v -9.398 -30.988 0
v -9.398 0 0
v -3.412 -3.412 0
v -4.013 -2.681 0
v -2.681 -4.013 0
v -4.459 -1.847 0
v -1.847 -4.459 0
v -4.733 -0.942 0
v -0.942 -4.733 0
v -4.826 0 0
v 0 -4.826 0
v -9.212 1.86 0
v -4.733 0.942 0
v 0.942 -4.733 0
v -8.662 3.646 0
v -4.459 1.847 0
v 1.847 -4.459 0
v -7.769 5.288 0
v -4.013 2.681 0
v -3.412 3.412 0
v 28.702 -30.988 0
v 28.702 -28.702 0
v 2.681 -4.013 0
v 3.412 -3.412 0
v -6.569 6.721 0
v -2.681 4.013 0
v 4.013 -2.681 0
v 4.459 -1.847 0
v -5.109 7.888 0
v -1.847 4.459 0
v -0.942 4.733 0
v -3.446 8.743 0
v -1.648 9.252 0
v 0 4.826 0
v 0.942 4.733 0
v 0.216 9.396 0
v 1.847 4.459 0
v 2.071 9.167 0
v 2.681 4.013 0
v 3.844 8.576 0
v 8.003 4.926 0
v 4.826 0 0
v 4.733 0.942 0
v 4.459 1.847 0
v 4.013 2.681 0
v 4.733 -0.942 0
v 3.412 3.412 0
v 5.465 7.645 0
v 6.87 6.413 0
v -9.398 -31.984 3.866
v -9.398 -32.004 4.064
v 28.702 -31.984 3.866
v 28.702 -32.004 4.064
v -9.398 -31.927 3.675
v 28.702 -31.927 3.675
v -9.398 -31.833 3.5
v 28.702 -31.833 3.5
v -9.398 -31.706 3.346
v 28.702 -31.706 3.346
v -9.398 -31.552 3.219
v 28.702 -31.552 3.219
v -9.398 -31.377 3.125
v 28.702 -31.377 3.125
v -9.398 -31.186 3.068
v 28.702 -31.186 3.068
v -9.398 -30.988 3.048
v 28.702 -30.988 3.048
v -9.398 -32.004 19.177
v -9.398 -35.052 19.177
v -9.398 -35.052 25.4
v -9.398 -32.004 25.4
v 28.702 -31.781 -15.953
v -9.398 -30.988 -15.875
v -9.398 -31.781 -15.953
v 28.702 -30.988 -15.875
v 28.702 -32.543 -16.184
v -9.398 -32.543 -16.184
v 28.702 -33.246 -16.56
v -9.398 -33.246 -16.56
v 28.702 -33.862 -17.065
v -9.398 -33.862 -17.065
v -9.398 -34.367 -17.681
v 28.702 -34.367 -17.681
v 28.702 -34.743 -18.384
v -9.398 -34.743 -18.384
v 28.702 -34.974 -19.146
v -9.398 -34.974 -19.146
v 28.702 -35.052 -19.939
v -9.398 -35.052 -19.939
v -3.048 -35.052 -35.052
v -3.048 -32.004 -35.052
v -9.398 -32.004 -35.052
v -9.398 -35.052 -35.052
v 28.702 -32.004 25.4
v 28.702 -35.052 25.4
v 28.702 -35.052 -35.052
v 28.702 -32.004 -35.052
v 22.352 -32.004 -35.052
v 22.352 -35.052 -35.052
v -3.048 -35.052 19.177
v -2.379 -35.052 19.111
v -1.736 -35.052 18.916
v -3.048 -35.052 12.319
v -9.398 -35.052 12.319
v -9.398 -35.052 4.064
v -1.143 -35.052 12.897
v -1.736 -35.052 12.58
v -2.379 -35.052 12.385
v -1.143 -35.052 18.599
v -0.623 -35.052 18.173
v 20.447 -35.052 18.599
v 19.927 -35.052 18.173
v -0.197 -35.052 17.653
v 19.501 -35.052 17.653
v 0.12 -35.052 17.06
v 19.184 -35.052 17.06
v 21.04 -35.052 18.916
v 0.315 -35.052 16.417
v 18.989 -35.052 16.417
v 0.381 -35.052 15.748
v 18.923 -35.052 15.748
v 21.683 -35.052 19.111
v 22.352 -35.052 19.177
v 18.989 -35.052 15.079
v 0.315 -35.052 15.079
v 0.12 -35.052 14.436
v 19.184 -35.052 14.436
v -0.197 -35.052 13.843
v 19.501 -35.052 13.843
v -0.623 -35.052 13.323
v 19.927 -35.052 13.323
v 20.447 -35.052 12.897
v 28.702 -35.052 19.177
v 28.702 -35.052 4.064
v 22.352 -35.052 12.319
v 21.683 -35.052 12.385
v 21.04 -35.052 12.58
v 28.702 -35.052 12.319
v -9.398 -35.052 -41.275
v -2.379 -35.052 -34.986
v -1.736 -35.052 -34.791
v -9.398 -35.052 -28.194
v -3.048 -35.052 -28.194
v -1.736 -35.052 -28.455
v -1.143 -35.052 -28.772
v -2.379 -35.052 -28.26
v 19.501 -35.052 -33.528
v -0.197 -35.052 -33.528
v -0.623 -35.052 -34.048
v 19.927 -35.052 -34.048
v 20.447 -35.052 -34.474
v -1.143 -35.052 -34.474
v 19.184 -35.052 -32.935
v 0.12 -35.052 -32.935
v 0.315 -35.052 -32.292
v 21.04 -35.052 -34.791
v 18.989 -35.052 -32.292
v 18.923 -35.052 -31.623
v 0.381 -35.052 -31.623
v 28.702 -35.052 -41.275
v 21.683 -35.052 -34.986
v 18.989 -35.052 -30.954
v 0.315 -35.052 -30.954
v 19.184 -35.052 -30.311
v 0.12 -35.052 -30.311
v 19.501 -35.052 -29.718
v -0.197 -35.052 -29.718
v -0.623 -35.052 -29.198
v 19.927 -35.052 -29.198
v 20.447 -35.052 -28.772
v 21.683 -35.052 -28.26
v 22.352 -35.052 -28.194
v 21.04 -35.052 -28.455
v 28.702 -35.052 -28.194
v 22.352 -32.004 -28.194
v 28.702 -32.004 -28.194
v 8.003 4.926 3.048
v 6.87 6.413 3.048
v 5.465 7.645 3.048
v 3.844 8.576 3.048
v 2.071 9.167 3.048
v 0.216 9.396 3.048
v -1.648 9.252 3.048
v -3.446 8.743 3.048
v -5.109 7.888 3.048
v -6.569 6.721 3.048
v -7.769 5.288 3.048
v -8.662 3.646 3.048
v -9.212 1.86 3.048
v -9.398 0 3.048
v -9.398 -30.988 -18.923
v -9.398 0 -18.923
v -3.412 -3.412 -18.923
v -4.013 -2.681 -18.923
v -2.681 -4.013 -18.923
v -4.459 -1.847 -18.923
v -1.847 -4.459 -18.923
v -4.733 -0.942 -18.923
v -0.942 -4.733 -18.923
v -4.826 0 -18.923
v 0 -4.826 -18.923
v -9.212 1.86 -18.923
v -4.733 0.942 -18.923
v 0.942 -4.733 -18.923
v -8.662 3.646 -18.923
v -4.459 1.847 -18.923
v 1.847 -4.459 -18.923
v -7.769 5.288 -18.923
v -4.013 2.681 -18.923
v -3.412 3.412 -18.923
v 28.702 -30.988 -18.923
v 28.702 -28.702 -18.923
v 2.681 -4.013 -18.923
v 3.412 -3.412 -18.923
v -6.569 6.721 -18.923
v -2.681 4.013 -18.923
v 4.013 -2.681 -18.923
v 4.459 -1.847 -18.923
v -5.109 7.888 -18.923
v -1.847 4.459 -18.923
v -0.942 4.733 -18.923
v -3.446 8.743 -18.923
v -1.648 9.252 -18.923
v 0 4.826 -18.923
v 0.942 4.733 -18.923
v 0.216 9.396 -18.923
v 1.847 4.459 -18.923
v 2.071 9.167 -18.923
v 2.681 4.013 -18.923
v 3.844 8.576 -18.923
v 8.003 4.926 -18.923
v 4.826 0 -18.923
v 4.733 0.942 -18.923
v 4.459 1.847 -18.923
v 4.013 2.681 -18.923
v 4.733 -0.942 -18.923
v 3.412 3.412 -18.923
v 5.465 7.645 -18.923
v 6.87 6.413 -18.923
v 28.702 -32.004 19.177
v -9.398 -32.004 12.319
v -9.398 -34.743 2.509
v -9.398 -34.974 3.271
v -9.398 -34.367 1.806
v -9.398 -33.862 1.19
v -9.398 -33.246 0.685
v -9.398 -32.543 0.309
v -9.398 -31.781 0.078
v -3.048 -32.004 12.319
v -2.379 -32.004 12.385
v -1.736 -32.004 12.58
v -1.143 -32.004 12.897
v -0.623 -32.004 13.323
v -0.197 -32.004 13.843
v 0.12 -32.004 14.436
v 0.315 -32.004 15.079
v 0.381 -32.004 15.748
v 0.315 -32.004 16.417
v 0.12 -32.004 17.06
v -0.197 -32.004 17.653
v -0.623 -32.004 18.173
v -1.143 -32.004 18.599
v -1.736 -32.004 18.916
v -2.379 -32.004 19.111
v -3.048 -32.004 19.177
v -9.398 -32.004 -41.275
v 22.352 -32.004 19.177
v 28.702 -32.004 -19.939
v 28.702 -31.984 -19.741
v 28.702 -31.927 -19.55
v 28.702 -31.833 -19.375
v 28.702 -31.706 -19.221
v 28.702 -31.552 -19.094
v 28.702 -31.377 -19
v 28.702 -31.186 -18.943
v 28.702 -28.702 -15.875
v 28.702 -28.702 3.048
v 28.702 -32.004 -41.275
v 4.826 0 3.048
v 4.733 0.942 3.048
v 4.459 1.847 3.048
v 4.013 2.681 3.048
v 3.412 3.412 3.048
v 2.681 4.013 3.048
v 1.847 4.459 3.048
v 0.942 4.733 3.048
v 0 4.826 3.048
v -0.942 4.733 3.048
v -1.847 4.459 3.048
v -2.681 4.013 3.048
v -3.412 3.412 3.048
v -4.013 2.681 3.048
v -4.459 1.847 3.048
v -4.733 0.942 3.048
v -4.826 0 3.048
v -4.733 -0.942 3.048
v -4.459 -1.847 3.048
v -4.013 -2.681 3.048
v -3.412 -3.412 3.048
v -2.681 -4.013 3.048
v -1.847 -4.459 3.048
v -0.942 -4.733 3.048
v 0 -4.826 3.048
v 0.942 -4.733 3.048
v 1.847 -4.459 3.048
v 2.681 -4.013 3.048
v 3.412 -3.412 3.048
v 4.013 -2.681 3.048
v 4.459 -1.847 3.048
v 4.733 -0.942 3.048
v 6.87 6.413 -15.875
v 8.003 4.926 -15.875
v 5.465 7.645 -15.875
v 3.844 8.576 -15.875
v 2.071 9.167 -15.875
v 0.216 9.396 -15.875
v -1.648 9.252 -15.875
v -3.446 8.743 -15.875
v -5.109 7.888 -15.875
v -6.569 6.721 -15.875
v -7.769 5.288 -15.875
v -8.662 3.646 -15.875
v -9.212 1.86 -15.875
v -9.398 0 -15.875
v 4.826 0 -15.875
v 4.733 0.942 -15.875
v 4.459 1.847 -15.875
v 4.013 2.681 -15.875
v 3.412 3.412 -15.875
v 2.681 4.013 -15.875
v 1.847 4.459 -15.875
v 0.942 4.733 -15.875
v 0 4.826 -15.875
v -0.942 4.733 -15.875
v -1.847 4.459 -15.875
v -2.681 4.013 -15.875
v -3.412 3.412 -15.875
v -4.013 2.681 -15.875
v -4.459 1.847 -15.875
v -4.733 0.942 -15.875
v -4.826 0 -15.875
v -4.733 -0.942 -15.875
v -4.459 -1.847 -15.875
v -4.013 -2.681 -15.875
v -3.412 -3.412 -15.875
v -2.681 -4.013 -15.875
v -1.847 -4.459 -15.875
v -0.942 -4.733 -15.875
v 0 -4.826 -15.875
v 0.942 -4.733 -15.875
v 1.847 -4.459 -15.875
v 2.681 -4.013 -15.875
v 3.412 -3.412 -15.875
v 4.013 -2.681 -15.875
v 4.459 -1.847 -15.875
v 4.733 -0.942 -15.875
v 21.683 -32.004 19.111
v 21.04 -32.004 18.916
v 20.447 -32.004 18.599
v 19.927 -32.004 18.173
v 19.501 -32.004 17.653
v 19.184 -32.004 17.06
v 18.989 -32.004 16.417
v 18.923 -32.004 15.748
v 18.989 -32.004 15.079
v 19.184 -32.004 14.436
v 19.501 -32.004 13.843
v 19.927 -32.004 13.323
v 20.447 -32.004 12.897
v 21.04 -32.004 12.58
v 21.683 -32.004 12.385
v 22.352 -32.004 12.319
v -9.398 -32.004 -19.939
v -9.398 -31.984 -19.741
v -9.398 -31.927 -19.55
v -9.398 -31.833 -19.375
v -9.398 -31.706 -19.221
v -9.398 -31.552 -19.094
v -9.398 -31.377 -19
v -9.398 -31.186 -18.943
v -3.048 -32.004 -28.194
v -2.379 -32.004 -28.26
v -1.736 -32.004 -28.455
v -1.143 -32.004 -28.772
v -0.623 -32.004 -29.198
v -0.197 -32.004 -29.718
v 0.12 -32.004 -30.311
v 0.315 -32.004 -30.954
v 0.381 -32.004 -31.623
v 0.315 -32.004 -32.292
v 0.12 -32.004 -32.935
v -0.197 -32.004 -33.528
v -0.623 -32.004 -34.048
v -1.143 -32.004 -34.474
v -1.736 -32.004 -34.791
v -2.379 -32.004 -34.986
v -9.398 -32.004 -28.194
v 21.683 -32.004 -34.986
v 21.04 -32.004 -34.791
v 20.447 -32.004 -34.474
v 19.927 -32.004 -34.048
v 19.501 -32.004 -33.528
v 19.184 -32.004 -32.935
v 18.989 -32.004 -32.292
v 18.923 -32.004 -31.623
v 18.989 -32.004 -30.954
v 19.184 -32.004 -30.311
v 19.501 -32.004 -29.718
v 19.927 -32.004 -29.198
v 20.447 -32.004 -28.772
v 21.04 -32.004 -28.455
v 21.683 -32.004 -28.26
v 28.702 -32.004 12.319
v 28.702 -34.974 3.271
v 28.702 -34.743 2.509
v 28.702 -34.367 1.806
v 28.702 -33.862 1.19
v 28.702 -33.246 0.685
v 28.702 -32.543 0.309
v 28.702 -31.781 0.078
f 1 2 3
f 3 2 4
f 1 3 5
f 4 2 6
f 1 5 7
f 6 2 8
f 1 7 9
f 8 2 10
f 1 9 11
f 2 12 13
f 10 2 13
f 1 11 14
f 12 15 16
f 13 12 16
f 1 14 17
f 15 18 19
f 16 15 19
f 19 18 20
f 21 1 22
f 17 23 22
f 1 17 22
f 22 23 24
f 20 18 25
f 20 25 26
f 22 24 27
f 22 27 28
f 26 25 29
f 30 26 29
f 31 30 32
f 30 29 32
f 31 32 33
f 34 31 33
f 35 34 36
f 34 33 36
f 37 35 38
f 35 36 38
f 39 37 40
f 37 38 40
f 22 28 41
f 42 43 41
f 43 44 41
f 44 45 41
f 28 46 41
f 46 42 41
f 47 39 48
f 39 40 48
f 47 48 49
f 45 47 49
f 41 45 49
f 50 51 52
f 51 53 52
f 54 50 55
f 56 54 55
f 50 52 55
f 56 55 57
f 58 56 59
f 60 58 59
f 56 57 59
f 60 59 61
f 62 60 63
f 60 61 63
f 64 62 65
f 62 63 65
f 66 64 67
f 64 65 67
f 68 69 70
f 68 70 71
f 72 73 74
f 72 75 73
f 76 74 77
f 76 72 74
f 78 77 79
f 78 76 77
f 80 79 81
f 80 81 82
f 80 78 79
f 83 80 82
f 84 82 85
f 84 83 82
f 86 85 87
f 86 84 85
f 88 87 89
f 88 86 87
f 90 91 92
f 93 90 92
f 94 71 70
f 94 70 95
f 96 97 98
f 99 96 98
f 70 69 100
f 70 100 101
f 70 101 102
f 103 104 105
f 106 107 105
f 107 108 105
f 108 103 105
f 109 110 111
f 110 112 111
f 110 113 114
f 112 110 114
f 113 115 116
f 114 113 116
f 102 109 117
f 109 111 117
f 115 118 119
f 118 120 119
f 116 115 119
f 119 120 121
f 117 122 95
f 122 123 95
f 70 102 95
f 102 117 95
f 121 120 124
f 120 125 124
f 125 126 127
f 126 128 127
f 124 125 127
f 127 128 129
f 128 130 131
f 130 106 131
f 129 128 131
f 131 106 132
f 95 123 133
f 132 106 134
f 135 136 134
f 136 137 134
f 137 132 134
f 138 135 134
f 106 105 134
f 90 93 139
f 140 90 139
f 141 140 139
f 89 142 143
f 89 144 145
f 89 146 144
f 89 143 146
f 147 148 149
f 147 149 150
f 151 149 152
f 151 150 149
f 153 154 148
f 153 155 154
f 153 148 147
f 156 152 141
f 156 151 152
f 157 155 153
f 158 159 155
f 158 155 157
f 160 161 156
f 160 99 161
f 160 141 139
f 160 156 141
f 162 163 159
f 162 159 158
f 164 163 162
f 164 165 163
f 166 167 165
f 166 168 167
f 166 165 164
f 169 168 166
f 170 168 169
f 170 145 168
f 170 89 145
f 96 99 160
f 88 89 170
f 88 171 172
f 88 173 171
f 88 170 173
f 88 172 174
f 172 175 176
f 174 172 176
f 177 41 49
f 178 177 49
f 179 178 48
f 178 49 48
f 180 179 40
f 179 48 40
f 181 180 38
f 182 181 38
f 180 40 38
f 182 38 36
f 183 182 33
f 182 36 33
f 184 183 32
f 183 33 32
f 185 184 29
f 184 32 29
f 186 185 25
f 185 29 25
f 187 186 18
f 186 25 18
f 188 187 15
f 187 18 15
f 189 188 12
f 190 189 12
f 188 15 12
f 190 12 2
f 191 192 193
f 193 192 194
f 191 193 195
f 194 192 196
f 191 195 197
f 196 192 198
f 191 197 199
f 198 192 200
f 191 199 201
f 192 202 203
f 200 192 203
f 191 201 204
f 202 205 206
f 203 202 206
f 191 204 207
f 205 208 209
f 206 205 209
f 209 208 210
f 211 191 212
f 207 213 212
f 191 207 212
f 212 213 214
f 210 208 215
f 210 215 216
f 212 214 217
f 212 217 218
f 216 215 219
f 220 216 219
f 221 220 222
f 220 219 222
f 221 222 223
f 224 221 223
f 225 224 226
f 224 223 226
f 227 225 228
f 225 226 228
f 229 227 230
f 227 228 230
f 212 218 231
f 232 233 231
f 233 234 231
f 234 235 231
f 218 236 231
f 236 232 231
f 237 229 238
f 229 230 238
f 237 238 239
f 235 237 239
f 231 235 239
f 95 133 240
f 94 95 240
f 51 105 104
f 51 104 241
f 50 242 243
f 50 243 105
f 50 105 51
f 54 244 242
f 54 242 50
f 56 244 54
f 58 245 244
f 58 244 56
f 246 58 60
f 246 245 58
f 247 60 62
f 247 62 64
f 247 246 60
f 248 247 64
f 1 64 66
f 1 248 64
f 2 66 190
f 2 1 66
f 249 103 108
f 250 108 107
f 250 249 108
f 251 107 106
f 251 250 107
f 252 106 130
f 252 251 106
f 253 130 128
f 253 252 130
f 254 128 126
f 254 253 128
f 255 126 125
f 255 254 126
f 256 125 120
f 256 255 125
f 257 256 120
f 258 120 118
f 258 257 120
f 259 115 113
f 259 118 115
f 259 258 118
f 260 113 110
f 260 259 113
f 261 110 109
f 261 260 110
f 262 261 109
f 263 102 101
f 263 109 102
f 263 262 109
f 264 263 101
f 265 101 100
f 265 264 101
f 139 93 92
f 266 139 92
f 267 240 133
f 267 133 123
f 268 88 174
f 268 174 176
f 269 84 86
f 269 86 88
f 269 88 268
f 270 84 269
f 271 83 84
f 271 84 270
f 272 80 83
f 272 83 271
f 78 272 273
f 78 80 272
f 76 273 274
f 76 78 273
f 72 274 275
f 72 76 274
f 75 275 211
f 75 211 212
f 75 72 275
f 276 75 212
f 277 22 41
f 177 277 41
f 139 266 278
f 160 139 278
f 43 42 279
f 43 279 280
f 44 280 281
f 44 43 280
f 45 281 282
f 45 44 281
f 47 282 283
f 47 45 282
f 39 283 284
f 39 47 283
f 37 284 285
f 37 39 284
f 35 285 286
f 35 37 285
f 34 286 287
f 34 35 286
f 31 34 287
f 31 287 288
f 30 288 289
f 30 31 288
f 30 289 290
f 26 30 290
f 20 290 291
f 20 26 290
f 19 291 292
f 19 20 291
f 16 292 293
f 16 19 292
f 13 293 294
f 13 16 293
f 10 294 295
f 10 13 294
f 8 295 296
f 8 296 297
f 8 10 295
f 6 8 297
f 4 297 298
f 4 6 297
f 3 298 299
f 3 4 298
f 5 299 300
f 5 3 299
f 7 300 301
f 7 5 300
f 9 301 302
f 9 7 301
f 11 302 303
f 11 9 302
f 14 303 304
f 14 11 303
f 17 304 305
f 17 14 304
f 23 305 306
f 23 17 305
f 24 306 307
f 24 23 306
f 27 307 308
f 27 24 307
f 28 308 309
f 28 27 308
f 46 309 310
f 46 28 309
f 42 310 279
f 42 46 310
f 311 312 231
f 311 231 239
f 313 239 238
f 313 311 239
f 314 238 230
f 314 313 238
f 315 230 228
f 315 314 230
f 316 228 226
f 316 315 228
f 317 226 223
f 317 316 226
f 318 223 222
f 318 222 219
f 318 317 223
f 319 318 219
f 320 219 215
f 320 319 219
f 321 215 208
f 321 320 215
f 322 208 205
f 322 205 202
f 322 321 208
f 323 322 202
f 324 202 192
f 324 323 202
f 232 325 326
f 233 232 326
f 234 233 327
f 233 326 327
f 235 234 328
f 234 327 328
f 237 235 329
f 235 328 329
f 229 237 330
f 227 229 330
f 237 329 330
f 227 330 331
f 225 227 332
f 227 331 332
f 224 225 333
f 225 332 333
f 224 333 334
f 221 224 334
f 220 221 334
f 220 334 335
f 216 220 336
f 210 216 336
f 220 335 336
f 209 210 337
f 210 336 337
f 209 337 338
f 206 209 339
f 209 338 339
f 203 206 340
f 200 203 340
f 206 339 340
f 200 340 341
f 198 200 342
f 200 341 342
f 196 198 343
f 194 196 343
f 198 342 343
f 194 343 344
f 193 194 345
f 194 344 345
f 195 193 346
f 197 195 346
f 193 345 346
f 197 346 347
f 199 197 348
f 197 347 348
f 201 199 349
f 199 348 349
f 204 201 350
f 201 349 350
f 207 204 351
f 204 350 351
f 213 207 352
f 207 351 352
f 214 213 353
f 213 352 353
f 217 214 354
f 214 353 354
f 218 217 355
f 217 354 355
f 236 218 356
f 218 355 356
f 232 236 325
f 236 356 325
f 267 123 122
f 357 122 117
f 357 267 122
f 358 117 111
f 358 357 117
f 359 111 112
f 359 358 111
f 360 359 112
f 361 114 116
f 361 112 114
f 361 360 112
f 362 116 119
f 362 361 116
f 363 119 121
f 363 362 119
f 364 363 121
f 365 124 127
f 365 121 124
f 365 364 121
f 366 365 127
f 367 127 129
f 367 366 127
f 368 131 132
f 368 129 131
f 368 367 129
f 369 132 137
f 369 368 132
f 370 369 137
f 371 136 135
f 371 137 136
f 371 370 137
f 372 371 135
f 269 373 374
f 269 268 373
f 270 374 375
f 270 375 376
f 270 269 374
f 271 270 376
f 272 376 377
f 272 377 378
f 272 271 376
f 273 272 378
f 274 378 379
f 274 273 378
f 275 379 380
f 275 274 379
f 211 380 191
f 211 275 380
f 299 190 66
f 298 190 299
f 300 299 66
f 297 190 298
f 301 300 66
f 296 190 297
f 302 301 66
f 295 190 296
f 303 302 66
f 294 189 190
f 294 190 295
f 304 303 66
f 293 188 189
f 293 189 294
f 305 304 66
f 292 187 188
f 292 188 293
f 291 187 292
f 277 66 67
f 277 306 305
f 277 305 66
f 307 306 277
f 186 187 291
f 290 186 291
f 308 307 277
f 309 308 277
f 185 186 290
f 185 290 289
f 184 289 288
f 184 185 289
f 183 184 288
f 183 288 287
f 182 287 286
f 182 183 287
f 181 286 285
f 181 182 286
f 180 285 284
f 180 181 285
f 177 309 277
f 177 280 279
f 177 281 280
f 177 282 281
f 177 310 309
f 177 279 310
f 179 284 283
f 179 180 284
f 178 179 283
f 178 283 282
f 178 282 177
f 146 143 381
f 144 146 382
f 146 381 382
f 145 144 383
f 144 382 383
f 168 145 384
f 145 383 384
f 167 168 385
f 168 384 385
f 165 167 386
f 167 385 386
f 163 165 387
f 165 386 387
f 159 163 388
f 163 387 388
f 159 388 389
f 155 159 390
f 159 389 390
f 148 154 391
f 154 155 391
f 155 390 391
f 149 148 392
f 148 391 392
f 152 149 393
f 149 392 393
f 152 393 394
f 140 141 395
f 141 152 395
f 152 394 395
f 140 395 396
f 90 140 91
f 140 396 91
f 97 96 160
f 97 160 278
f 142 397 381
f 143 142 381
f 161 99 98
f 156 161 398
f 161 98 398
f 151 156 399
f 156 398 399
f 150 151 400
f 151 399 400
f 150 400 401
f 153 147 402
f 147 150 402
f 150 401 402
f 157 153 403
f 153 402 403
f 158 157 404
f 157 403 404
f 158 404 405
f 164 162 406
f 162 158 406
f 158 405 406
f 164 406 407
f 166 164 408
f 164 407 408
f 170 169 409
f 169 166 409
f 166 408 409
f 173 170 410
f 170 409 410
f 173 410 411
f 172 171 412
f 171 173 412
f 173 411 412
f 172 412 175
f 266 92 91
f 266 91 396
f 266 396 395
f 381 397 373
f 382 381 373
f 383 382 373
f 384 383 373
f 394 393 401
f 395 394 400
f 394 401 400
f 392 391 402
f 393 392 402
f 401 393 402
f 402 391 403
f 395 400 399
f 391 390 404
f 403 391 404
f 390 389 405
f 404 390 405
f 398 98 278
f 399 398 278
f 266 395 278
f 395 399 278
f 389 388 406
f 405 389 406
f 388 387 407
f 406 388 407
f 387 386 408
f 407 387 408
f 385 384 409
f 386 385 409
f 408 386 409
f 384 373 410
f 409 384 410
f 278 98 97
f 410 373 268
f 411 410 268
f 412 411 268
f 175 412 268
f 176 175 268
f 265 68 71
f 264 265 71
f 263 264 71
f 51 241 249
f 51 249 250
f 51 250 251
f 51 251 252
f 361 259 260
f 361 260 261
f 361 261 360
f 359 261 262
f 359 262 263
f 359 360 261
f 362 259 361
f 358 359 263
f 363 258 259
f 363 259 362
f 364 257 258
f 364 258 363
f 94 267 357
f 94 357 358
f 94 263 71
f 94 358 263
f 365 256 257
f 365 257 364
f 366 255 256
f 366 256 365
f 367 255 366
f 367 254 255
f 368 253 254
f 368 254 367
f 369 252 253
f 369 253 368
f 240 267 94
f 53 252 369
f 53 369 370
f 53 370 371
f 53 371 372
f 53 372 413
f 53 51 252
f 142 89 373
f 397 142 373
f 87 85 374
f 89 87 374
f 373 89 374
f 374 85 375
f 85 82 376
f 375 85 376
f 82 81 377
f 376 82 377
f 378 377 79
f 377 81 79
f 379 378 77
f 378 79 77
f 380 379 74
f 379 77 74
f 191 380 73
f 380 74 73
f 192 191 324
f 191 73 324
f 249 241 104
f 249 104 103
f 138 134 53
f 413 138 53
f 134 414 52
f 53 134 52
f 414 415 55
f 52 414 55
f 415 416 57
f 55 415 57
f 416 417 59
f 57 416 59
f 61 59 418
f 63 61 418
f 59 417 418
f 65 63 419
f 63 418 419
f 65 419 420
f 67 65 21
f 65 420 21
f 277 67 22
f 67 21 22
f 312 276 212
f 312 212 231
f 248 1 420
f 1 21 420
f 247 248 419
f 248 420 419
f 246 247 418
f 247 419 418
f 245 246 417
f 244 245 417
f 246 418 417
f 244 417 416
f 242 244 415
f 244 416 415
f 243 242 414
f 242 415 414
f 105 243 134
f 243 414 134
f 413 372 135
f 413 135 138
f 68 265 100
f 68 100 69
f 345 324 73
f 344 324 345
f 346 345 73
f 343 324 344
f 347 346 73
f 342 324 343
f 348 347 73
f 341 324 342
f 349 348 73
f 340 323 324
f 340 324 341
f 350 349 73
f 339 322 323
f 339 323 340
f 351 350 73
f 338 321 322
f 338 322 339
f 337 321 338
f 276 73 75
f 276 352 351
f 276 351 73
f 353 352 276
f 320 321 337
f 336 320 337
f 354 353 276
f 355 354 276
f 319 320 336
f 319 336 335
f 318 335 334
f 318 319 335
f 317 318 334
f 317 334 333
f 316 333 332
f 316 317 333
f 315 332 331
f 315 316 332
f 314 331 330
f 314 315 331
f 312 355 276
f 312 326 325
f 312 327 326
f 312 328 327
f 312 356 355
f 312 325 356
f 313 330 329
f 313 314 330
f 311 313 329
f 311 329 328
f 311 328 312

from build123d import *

# Parameters (mm, degrees)
SKETCH3_R           = 4.826
BOSS_EXTRUDE1_DEPTH = 3.048
SKETCH4_W           = 38.1
SKETCH4_H           = 3.048
BOSS_EXTRUDE2_DEPTH = 22.352
CUT_EXTRUDE1_DEPTH  = 4.048
FILLET1_R           = 1.016
FILLET2_R           = 4.064


with BuildPart() as part:
    # Sketch3 → Boss-Extrude1 (new body)
    with BuildSketch(Plane.XY):
        with BuildLine():
            Line((-9.398, 0), (-9.398, -35.052))
            Line((-9.398, -35.052), (28.702, -35.052))
            Line((28.702, -35.052), (28.702, -28.702))
            Line((28.702, -28.702), (8.003429206, 4.926207967))
            ThreePointArc((8.003429206, 4.926207967), (-2.559900029, 9.042638765), (-9.398, 0))
        make_face()
        Circle(SKETCH3_R, mode=Mode.SUBTRACT)
    extrude(amount=BOSS_EXTRUDE1_DEPTH)

    # Sketch4 → Boss-Extrude2 (add)
    with BuildSketch(Plane.XY.offset(3.048)):
        with Locations((9.652, -33.528)):
            Rectangle(SKETCH4_W, SKETCH4_H)
    extrude(amount=BOSS_EXTRUDE2_DEPTH)

    # Sketch5 → Cut-Extrude1 (cut, through all)
    with BuildSketch(Plane(origin=(0, -32.004, 0), x_dir=(1, 0, 0), z_dir=(0, 1, 0))):
        with BuildLine():
            Line((-3.048, -19.177), (-9.398, -19.177))
            Line((-9.398, -19.177), (-9.398, -12.319))
            Line((-9.398, -12.319), (-3.048, -12.319))
            ThreePointArc((-3.048, -12.319), (0.381, -15.748), (-3.048, -19.177))
        make_face()
        with BuildLine():
            Line((22.352, -12.319), (28.702, -12.319))
            Line((28.702, -12.319), (28.702, -19.177))
            Line((28.702, -19.177), (22.352, -19.177))
            ThreePointArc((22.352, -19.177), (18.923, -15.748), (22.352, -12.319))
        make_face()
    extrude(amount=-CUT_EXTRUDE1_DEPTH, mode=Mode.SUBTRACT)

    # Fillet1
    fillet1_edges = [part.edges().sort_by_distance(p)[0] for p in [
        (9.652, -32.004, 3.048),
    ]]
    fillet(fillet1_edges, radius=FILLET1_R)

    # Fillet2
    fillet2_edges = [part.edges().sort_by_distance(p)[0] for p in [
        (9.652, -35.052, 0),
    ]]
    fillet(fillet2_edges, radius=FILLET2_R)


with BuildPart() as body_2:
    # Mirror2: mirrored copy
    add(part.part.mirror(Plane.XY.offset(-7.9375)))


solid = Compound([part.part, body_2.part])
